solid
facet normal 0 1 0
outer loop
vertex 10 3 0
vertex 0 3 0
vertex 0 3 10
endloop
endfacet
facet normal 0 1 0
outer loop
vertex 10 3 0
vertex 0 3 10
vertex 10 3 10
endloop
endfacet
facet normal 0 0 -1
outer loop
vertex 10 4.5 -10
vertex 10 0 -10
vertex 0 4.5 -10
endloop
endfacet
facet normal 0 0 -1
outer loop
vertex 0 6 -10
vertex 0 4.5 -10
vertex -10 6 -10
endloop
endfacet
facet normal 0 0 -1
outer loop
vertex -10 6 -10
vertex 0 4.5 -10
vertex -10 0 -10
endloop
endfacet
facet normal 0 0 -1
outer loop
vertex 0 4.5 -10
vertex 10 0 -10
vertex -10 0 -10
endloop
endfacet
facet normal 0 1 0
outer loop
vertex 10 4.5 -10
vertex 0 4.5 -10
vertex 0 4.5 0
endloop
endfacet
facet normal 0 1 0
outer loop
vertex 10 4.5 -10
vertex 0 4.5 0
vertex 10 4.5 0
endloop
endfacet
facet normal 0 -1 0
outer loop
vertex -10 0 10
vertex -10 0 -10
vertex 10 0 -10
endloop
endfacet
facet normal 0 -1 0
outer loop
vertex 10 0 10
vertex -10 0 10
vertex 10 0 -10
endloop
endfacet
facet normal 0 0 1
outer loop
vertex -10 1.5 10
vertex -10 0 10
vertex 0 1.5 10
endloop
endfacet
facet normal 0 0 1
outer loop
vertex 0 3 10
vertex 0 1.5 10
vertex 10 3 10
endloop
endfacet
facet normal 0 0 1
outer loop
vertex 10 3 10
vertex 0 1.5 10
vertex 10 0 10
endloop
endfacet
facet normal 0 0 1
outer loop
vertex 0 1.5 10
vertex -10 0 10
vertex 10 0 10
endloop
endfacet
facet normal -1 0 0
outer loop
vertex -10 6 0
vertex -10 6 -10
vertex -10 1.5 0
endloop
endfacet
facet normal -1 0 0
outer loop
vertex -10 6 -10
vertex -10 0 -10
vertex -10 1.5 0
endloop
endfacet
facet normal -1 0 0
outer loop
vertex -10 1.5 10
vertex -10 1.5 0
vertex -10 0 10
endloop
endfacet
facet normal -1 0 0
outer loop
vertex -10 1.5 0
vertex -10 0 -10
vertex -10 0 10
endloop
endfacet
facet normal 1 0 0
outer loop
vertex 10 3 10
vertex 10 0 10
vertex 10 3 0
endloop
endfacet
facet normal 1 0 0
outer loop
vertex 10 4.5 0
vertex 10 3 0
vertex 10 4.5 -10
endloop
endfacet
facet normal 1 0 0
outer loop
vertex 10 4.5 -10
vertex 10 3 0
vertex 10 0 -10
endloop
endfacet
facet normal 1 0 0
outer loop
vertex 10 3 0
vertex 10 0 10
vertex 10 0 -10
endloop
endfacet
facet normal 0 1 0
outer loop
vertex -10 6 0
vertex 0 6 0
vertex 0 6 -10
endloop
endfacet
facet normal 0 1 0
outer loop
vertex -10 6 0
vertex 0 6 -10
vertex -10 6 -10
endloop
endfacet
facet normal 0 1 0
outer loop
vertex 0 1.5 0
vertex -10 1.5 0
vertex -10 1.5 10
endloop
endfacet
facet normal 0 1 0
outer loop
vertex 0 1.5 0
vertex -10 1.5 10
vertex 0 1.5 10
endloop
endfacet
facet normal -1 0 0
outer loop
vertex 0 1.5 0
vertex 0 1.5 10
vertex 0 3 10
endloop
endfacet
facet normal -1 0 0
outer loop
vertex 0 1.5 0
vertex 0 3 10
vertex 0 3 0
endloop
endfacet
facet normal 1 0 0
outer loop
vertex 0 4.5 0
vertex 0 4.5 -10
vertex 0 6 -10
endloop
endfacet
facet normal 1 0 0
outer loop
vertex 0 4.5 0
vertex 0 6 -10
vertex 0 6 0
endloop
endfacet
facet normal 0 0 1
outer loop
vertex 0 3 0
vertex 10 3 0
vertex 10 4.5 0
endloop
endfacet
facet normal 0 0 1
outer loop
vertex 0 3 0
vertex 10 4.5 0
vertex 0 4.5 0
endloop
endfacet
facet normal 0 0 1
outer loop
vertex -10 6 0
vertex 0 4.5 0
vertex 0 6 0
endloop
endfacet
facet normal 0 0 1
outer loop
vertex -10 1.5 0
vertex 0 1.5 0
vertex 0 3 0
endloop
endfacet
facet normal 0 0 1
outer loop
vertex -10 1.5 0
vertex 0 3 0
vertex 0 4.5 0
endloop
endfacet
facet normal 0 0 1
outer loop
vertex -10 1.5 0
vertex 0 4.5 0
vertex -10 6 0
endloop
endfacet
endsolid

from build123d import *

# Parameters (mm, degrees)
SKETCH1_W      = 20
SKETCH1_H      = 20
EXTRUDE1_DEPTH = 1.5
SKETCH2_W      = 20
SKETCH2_H      = 10
EXTRUDE2_DEPTH = 3
SKETCH3_W      = 10
SKETCH3_H      = 10
EXTRUDE3_DEPTH = 1.5
SKETCH4_W      = 10
SKETCH4_H      = 10
EXTRUDE4_DEPTH = 1.5


with BuildPart() as part:
    # Sketch1 → Extrude1 (new body)
    with BuildSketch(Plane(origin=(0, 0, 0), x_dir=(1, 0, 0), z_dir=(0, 1, 0))):
        Rectangle(SKETCH1_W, SKETCH1_H)
    extrude(amount=EXTRUDE1_DEPTH)

    # Sketch2 → Extrude2 (add)
    with BuildSketch(Plane(origin=(0, 1.5, 0), x_dir=(1, 0, 0), z_dir=(0, 1, 0))):
        with Locations((0, 5)):
            Rectangle(SKETCH2_W, SKETCH2_H)
    extrude(amount=EXTRUDE2_DEPTH)

    # Sketch3 → Extrude3 (add)
    with BuildSketch(Plane(origin=(0, 1.5, 0), x_dir=(1, 0, 0), z_dir=(0, 1, 0))):
        with Locations((5, -5)):
            Rectangle(SKETCH3_W, SKETCH3_H)
    extrude(amount=EXTRUDE3_DEPTH)

    # Sketch4 → Extrude4 (add)
    with BuildSketch(Plane(origin=(0, 4.5, 0), x_dir=(-1, 0, 0), z_dir=(0, 1, 0))):
        with Locations((5, -5)):
            Rectangle(SKETCH4_W, SKETCH4_H)
    extrude(amount=EXTRUDE4_DEPTH)


solid = part.part
